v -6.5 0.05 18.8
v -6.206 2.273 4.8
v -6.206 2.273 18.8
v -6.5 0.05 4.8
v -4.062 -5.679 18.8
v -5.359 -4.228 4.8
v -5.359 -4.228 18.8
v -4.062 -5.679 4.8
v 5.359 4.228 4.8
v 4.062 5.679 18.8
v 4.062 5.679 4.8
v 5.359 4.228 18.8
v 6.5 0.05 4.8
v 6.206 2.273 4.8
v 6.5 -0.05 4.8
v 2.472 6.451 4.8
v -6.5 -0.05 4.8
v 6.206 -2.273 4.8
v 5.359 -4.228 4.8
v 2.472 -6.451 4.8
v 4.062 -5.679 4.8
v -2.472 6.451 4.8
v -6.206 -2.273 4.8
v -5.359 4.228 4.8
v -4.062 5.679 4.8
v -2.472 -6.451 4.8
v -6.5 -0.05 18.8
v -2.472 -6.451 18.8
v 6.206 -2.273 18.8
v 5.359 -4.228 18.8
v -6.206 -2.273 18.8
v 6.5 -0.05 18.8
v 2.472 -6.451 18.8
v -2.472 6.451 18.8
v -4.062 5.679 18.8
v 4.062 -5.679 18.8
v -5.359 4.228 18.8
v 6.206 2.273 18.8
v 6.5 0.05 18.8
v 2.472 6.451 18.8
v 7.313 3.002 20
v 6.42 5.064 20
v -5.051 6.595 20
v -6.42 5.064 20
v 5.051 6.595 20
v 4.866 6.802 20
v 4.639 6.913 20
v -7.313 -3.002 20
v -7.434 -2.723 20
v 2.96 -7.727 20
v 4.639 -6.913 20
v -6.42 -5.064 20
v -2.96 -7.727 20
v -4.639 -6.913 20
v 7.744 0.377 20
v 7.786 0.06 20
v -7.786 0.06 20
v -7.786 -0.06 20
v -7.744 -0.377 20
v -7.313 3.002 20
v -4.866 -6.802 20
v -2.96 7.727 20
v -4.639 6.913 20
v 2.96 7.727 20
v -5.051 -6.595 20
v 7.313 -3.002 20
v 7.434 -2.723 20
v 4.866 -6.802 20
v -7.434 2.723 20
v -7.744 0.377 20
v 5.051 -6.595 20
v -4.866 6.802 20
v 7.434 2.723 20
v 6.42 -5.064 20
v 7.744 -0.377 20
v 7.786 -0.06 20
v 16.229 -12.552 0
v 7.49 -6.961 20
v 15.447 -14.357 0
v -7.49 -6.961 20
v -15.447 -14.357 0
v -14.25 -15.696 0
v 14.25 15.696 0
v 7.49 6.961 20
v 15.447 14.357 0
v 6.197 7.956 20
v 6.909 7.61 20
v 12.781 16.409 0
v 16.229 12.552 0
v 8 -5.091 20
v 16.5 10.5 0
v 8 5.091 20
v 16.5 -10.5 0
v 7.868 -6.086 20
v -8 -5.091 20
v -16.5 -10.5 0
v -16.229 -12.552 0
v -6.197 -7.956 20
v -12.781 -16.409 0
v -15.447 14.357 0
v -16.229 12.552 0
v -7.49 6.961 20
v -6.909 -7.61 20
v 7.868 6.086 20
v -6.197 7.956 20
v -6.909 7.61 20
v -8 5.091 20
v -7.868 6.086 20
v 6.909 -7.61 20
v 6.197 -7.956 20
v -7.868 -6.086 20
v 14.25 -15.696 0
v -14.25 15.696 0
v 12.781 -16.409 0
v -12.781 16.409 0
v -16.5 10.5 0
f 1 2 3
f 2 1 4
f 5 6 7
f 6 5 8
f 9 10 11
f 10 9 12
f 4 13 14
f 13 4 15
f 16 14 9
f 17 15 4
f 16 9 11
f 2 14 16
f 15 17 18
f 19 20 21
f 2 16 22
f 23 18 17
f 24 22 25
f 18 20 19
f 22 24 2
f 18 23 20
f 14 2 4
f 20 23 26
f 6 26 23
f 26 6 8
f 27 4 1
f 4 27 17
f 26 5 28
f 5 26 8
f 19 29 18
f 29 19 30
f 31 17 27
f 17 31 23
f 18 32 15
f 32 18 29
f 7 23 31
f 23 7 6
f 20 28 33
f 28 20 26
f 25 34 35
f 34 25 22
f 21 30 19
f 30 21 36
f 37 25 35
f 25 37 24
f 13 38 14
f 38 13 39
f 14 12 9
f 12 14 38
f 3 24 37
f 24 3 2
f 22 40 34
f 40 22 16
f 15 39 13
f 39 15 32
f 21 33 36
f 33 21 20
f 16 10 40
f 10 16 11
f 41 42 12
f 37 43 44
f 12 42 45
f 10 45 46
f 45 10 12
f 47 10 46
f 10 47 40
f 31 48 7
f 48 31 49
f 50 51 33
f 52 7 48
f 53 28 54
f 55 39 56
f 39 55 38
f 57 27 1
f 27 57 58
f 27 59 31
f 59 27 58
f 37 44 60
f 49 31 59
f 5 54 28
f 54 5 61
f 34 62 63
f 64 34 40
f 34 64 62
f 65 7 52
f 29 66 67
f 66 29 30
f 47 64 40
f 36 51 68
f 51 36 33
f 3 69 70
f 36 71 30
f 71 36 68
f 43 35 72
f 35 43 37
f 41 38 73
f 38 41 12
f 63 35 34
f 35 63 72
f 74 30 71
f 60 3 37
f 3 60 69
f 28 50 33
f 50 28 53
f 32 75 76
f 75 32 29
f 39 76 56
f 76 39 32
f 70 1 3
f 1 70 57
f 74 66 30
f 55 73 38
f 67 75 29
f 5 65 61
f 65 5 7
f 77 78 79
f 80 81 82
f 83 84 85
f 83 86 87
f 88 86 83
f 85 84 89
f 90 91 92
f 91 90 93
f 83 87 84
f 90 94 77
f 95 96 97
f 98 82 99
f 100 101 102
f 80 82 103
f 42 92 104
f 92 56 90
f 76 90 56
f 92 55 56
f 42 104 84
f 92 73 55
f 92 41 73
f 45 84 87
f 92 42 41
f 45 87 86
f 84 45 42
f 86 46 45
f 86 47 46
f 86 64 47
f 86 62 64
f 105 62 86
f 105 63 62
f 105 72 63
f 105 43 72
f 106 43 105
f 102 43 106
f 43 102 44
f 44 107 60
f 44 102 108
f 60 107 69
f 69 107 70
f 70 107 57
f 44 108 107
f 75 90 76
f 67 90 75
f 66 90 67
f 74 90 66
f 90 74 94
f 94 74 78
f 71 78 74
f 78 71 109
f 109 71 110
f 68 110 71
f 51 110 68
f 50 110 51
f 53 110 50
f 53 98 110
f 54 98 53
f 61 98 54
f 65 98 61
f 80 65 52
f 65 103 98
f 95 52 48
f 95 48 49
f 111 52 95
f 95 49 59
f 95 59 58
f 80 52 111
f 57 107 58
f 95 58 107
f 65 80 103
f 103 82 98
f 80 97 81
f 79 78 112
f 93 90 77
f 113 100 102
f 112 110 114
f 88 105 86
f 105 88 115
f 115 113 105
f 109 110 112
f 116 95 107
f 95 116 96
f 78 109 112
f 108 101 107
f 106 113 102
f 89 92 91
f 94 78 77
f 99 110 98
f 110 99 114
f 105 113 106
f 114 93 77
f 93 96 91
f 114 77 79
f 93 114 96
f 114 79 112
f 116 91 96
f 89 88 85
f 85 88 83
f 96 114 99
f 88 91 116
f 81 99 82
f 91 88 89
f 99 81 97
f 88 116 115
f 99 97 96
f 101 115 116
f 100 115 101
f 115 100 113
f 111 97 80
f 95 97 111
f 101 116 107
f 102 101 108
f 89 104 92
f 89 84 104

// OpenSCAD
// MODEL_VERSION = "v1.3.1"  // обновляйте номер при изменениях

// Short description for models table
description = "ECig platform stand with oval cup";

// Shared library
use <../modules.scad>

// ====================== Точность рендера ======================
$fn = 0;        // фиксированную сегментацию отключаем
$fa = 6;        // 5–8° обычно достаточно
$fs = 0.35;     // ≈ диаметр сопла (0.3–0.5 для сопла 0.4)
pin_fs = 0.25;  // чуть тоньше для штырей и отверстий

// ====================== Служебные параметры ===================
screen_frame_gap = 0.2; // только для высоты вычитаний (не влияет на XY)

// ====================== Режим фрагмента ======================
test_fragment = false;   // true — печатать только угловые фрагменты (base)
frag_size     = 20;     // размер квадрата вырезки, мм
frag_index    = 0;      // 0=НЛ, 1=ВЛ, 2=НП, 3=ВП (относительно основания)
frag_gap_x    = 10;     // зазор между фрагментами по X, мм
frag_h_extra  = 20;     // запас по высоте клипа, мм

// ====================== Габариты сигареты =====================
cig_w = 13;   // ширина (длинная ось «капсулы»), мм
cig_t = 13;   // толщина (короткая ось), мм

// Посадка стакана
fit_gap   = 0.00; // технологический зазор на сторону, мм
wall_thk  = 1.0;  // толщина стенок по умолчанию, мм (информативно)
cup_depth = 15.0; // глубина стакана, мм

// Анизотропное скругление профиля стакана
cup_r_ratio = 0.75; // радиус по ширине в cup_r_ratio раза больше, чем по длине

// Подставка (основание на 1 см шире по каждой стороне)
base_margin   = 10.0;  // прибавка по X и Y с каждой стороны, мм
bottom_floor  = 5.0;   // толщина дна под стаканом, мм
base_h        = cup_depth + bottom_floor; // высота постамента, мм
base_round_r  = 6.0;   // радиус скруглений по XY у постамента, мм

// Сужение внешних стенок от низа к верху (скос)
// Режимы: "auto" — верх внешнего контура автоматически подгоняется
//          к размеру горловины стакана + 2*rim_w (слияние при rim_w=0)
//          "manual" — использовать явные величины сокращения.
taper_mode = "auto";      // "auto" | "manual"
rim_w      = 0.0;          // ширина буртика сверху между внешней стенкой и стаканом, мм
manual_outer_taper_total_x = 15.0; // ручное уменьшение по X, мм
manual_outer_taper_total_y = 15.0; // ручное уменьшение по Y, мм

// Фаска по кромке стакана (верхняя кромка внутренней полости)
edge_chamfer_z = 1.0;  // высота фаски по Z, мм
edge_chamfer_x = 1.5;  // «вылет» фаски по X (на сторону), мм
edge_chamfer_y = 1.5;  // «вылет» фаски по Y (на сторону), мм

// ====================== Комментарии ===========================
/*
Модель: постамент с внутренним «стаканом» под овально-прямоугольный корпус
Блоки:
- Переменные (вверху) для всех размеров
- Комментарии (этот блок)
- Функции фрагментов детали (ниже)
- Функция вывода всех фрагментов show_all()
- Функция обрезки через intersection при test_fragment=true

Детали: base (главная деталь)
План:
- Основание — скруглённый прямоугольник (капсула) по XY, высотой base_h.
- Стакан — внутренний вырез-«капсула» размером (cig_w + 2*fit_gap) × (cig_t + 2*fit_gap)
  на глубину cup_depth с фаской edge_chamfer_* по верхней кромке.
- Габариты основания больше сигареты на base_margin с каждой стороны (т.е. +20 мм по каждой оси).
*/

// ====================== Вспомогательные 2D ====================
// (use rounded_rect_centered / rounded_rect_aniso from modules.scad)

// Профиль стакана с овальными торцами (rx:ry = cup_r_ratio:1)
module cup_profile2d(w, h) {
    ry = min(h/2, w/(2*cup_r_ratio));
    rx = min(w/2, cup_r_ratio*ry);
    rounded_rect_aniso(w, h, rx, ry);
}

// Профиль основания (внешний контур) с тем же cup_r_ratio
module base_profile2d(w, h, rr) {
    // rr — отношение радиусов rx/ry, общее для всех прямоугольников
    // ограничиваем максимальный малый радиус параметром base_round_r
    ry = min(h/2, w/(2*rr), base_round_r);
    rx = min(w/2, rr*ry, base_round_r*rr);
    rounded_rect_aniso(w, h, rx, ry);
}

// ====================== Геометрия деталей =====================
module base_solid() {
    base_w = cig_w + 2*base_margin;
    base_t = cig_t + 2*base_margin;

    // Автоподгонка сужения к горловине стакана
    cup_w = cig_w + 2*fit_gap;
    cup_t = cig_t + 2*fit_gap;
    top_w_auto = cup_w + 2*edge_chamfer_x + 2*rim_w;
    top_t_auto = cup_t + 2*edge_chamfer_y + 2*rim_w;

    taper_x = (taper_mode=="auto") ? (base_w - top_w_auto) : manual_outer_taper_total_x;
    taper_y = (taper_mode=="auto") ? (base_t - top_t_auto) : manual_outer_taper_total_y;

    sx = max((base_w - taper_x) / max(base_w, eps()), 0.1);
    sy = max((base_t - taper_y) / max(base_t, eps()), 0.1);

    // Чтобы верхняя кромка имела те же пропорции скруглений, что и стакан,
    // компенсируем анизотропное масштабирование: на дне ставим rr_bottom,
    // которое после масштабов [sx,sy] даст cup_r_ratio на верху.
    rr_bottom = cup_r_ratio * (sy / sx);

    linear_extrude(height=base_h, scale=[sx, sy])
        base_profile2d(base_w, base_t, rr_bottom);
}

// Вырез стакана (основной объём + фаска верхней кромки)
module cup_cut() {
    cup_w = cig_w + 2*fit_gap;
    cup_t = cig_t + 2*fit_gap;

    // Главный вертикальный вырез
    translate([0,0, base_h - cup_depth - screen_frame_gap])
        linear_extrude(height=cup_depth + 2*screen_frame_gap)
            cup_profile2d(cup_w, cup_t);

    // Фаска: конический (frustum) вырез сверху
    sx = (cup_w + 2*edge_chamfer_x) / max(cup_w, eps());
    sy = (cup_t + 2*edge_chamfer_y) / max(cup_t, eps());
    translate([0,0, base_h - edge_chamfer_z - screen_frame_gap])
        linear_extrude(height=edge_chamfer_z + 2*screen_frame_gap, scale=[sx, sy])
            cup_profile2d(cup_w, cup_t);
}
 
// Основная деталь
module base() {
    difference() {
        base_solid();
        cup_cut();
    }
} 

// ====================== Клипперы фрагментов ===================
module corner_clipper(i=0) {
    // 0=НЛ, 1=ВЛ, 2=НП, 3=ВП
    base_w = cig_w + 2*base_margin;
    base_t = cig_t + 2*base_margin;
    dx = (i==0 || i==1) ? -(base_w/2 - frag_size/2)
       : (i==2 || i==3) ?  (base_w/2 - frag_size/2) : 0;
    dy = (i==0 || i==2) ? -(base_t/2 - frag_size/2)
       : (i==1 || i==3) ?  (base_t/2 - frag_size/2) : 0;

    translate([dx, dy, base_h/2])
        cube([frag_size, frag_size, base_h + frag_h_extra], center=true);
}

// Показ либо целой модели, либо тестового фрагмента
module show_all() {
    if (!test_fragment) {
        base();
    } else {
        translate([- (frag_size/2 + frag_gap_x/2), 0, 0])
            intersection() { base(); corner_clipper(frag_index); }
        translate([  (frag_size/2 + frag_gap_x/2), 0, 0])
            intersection() { base(); corner_clipper(frag_index); }
    }
}

// ====================== Старт рендера =========================
show_all();
